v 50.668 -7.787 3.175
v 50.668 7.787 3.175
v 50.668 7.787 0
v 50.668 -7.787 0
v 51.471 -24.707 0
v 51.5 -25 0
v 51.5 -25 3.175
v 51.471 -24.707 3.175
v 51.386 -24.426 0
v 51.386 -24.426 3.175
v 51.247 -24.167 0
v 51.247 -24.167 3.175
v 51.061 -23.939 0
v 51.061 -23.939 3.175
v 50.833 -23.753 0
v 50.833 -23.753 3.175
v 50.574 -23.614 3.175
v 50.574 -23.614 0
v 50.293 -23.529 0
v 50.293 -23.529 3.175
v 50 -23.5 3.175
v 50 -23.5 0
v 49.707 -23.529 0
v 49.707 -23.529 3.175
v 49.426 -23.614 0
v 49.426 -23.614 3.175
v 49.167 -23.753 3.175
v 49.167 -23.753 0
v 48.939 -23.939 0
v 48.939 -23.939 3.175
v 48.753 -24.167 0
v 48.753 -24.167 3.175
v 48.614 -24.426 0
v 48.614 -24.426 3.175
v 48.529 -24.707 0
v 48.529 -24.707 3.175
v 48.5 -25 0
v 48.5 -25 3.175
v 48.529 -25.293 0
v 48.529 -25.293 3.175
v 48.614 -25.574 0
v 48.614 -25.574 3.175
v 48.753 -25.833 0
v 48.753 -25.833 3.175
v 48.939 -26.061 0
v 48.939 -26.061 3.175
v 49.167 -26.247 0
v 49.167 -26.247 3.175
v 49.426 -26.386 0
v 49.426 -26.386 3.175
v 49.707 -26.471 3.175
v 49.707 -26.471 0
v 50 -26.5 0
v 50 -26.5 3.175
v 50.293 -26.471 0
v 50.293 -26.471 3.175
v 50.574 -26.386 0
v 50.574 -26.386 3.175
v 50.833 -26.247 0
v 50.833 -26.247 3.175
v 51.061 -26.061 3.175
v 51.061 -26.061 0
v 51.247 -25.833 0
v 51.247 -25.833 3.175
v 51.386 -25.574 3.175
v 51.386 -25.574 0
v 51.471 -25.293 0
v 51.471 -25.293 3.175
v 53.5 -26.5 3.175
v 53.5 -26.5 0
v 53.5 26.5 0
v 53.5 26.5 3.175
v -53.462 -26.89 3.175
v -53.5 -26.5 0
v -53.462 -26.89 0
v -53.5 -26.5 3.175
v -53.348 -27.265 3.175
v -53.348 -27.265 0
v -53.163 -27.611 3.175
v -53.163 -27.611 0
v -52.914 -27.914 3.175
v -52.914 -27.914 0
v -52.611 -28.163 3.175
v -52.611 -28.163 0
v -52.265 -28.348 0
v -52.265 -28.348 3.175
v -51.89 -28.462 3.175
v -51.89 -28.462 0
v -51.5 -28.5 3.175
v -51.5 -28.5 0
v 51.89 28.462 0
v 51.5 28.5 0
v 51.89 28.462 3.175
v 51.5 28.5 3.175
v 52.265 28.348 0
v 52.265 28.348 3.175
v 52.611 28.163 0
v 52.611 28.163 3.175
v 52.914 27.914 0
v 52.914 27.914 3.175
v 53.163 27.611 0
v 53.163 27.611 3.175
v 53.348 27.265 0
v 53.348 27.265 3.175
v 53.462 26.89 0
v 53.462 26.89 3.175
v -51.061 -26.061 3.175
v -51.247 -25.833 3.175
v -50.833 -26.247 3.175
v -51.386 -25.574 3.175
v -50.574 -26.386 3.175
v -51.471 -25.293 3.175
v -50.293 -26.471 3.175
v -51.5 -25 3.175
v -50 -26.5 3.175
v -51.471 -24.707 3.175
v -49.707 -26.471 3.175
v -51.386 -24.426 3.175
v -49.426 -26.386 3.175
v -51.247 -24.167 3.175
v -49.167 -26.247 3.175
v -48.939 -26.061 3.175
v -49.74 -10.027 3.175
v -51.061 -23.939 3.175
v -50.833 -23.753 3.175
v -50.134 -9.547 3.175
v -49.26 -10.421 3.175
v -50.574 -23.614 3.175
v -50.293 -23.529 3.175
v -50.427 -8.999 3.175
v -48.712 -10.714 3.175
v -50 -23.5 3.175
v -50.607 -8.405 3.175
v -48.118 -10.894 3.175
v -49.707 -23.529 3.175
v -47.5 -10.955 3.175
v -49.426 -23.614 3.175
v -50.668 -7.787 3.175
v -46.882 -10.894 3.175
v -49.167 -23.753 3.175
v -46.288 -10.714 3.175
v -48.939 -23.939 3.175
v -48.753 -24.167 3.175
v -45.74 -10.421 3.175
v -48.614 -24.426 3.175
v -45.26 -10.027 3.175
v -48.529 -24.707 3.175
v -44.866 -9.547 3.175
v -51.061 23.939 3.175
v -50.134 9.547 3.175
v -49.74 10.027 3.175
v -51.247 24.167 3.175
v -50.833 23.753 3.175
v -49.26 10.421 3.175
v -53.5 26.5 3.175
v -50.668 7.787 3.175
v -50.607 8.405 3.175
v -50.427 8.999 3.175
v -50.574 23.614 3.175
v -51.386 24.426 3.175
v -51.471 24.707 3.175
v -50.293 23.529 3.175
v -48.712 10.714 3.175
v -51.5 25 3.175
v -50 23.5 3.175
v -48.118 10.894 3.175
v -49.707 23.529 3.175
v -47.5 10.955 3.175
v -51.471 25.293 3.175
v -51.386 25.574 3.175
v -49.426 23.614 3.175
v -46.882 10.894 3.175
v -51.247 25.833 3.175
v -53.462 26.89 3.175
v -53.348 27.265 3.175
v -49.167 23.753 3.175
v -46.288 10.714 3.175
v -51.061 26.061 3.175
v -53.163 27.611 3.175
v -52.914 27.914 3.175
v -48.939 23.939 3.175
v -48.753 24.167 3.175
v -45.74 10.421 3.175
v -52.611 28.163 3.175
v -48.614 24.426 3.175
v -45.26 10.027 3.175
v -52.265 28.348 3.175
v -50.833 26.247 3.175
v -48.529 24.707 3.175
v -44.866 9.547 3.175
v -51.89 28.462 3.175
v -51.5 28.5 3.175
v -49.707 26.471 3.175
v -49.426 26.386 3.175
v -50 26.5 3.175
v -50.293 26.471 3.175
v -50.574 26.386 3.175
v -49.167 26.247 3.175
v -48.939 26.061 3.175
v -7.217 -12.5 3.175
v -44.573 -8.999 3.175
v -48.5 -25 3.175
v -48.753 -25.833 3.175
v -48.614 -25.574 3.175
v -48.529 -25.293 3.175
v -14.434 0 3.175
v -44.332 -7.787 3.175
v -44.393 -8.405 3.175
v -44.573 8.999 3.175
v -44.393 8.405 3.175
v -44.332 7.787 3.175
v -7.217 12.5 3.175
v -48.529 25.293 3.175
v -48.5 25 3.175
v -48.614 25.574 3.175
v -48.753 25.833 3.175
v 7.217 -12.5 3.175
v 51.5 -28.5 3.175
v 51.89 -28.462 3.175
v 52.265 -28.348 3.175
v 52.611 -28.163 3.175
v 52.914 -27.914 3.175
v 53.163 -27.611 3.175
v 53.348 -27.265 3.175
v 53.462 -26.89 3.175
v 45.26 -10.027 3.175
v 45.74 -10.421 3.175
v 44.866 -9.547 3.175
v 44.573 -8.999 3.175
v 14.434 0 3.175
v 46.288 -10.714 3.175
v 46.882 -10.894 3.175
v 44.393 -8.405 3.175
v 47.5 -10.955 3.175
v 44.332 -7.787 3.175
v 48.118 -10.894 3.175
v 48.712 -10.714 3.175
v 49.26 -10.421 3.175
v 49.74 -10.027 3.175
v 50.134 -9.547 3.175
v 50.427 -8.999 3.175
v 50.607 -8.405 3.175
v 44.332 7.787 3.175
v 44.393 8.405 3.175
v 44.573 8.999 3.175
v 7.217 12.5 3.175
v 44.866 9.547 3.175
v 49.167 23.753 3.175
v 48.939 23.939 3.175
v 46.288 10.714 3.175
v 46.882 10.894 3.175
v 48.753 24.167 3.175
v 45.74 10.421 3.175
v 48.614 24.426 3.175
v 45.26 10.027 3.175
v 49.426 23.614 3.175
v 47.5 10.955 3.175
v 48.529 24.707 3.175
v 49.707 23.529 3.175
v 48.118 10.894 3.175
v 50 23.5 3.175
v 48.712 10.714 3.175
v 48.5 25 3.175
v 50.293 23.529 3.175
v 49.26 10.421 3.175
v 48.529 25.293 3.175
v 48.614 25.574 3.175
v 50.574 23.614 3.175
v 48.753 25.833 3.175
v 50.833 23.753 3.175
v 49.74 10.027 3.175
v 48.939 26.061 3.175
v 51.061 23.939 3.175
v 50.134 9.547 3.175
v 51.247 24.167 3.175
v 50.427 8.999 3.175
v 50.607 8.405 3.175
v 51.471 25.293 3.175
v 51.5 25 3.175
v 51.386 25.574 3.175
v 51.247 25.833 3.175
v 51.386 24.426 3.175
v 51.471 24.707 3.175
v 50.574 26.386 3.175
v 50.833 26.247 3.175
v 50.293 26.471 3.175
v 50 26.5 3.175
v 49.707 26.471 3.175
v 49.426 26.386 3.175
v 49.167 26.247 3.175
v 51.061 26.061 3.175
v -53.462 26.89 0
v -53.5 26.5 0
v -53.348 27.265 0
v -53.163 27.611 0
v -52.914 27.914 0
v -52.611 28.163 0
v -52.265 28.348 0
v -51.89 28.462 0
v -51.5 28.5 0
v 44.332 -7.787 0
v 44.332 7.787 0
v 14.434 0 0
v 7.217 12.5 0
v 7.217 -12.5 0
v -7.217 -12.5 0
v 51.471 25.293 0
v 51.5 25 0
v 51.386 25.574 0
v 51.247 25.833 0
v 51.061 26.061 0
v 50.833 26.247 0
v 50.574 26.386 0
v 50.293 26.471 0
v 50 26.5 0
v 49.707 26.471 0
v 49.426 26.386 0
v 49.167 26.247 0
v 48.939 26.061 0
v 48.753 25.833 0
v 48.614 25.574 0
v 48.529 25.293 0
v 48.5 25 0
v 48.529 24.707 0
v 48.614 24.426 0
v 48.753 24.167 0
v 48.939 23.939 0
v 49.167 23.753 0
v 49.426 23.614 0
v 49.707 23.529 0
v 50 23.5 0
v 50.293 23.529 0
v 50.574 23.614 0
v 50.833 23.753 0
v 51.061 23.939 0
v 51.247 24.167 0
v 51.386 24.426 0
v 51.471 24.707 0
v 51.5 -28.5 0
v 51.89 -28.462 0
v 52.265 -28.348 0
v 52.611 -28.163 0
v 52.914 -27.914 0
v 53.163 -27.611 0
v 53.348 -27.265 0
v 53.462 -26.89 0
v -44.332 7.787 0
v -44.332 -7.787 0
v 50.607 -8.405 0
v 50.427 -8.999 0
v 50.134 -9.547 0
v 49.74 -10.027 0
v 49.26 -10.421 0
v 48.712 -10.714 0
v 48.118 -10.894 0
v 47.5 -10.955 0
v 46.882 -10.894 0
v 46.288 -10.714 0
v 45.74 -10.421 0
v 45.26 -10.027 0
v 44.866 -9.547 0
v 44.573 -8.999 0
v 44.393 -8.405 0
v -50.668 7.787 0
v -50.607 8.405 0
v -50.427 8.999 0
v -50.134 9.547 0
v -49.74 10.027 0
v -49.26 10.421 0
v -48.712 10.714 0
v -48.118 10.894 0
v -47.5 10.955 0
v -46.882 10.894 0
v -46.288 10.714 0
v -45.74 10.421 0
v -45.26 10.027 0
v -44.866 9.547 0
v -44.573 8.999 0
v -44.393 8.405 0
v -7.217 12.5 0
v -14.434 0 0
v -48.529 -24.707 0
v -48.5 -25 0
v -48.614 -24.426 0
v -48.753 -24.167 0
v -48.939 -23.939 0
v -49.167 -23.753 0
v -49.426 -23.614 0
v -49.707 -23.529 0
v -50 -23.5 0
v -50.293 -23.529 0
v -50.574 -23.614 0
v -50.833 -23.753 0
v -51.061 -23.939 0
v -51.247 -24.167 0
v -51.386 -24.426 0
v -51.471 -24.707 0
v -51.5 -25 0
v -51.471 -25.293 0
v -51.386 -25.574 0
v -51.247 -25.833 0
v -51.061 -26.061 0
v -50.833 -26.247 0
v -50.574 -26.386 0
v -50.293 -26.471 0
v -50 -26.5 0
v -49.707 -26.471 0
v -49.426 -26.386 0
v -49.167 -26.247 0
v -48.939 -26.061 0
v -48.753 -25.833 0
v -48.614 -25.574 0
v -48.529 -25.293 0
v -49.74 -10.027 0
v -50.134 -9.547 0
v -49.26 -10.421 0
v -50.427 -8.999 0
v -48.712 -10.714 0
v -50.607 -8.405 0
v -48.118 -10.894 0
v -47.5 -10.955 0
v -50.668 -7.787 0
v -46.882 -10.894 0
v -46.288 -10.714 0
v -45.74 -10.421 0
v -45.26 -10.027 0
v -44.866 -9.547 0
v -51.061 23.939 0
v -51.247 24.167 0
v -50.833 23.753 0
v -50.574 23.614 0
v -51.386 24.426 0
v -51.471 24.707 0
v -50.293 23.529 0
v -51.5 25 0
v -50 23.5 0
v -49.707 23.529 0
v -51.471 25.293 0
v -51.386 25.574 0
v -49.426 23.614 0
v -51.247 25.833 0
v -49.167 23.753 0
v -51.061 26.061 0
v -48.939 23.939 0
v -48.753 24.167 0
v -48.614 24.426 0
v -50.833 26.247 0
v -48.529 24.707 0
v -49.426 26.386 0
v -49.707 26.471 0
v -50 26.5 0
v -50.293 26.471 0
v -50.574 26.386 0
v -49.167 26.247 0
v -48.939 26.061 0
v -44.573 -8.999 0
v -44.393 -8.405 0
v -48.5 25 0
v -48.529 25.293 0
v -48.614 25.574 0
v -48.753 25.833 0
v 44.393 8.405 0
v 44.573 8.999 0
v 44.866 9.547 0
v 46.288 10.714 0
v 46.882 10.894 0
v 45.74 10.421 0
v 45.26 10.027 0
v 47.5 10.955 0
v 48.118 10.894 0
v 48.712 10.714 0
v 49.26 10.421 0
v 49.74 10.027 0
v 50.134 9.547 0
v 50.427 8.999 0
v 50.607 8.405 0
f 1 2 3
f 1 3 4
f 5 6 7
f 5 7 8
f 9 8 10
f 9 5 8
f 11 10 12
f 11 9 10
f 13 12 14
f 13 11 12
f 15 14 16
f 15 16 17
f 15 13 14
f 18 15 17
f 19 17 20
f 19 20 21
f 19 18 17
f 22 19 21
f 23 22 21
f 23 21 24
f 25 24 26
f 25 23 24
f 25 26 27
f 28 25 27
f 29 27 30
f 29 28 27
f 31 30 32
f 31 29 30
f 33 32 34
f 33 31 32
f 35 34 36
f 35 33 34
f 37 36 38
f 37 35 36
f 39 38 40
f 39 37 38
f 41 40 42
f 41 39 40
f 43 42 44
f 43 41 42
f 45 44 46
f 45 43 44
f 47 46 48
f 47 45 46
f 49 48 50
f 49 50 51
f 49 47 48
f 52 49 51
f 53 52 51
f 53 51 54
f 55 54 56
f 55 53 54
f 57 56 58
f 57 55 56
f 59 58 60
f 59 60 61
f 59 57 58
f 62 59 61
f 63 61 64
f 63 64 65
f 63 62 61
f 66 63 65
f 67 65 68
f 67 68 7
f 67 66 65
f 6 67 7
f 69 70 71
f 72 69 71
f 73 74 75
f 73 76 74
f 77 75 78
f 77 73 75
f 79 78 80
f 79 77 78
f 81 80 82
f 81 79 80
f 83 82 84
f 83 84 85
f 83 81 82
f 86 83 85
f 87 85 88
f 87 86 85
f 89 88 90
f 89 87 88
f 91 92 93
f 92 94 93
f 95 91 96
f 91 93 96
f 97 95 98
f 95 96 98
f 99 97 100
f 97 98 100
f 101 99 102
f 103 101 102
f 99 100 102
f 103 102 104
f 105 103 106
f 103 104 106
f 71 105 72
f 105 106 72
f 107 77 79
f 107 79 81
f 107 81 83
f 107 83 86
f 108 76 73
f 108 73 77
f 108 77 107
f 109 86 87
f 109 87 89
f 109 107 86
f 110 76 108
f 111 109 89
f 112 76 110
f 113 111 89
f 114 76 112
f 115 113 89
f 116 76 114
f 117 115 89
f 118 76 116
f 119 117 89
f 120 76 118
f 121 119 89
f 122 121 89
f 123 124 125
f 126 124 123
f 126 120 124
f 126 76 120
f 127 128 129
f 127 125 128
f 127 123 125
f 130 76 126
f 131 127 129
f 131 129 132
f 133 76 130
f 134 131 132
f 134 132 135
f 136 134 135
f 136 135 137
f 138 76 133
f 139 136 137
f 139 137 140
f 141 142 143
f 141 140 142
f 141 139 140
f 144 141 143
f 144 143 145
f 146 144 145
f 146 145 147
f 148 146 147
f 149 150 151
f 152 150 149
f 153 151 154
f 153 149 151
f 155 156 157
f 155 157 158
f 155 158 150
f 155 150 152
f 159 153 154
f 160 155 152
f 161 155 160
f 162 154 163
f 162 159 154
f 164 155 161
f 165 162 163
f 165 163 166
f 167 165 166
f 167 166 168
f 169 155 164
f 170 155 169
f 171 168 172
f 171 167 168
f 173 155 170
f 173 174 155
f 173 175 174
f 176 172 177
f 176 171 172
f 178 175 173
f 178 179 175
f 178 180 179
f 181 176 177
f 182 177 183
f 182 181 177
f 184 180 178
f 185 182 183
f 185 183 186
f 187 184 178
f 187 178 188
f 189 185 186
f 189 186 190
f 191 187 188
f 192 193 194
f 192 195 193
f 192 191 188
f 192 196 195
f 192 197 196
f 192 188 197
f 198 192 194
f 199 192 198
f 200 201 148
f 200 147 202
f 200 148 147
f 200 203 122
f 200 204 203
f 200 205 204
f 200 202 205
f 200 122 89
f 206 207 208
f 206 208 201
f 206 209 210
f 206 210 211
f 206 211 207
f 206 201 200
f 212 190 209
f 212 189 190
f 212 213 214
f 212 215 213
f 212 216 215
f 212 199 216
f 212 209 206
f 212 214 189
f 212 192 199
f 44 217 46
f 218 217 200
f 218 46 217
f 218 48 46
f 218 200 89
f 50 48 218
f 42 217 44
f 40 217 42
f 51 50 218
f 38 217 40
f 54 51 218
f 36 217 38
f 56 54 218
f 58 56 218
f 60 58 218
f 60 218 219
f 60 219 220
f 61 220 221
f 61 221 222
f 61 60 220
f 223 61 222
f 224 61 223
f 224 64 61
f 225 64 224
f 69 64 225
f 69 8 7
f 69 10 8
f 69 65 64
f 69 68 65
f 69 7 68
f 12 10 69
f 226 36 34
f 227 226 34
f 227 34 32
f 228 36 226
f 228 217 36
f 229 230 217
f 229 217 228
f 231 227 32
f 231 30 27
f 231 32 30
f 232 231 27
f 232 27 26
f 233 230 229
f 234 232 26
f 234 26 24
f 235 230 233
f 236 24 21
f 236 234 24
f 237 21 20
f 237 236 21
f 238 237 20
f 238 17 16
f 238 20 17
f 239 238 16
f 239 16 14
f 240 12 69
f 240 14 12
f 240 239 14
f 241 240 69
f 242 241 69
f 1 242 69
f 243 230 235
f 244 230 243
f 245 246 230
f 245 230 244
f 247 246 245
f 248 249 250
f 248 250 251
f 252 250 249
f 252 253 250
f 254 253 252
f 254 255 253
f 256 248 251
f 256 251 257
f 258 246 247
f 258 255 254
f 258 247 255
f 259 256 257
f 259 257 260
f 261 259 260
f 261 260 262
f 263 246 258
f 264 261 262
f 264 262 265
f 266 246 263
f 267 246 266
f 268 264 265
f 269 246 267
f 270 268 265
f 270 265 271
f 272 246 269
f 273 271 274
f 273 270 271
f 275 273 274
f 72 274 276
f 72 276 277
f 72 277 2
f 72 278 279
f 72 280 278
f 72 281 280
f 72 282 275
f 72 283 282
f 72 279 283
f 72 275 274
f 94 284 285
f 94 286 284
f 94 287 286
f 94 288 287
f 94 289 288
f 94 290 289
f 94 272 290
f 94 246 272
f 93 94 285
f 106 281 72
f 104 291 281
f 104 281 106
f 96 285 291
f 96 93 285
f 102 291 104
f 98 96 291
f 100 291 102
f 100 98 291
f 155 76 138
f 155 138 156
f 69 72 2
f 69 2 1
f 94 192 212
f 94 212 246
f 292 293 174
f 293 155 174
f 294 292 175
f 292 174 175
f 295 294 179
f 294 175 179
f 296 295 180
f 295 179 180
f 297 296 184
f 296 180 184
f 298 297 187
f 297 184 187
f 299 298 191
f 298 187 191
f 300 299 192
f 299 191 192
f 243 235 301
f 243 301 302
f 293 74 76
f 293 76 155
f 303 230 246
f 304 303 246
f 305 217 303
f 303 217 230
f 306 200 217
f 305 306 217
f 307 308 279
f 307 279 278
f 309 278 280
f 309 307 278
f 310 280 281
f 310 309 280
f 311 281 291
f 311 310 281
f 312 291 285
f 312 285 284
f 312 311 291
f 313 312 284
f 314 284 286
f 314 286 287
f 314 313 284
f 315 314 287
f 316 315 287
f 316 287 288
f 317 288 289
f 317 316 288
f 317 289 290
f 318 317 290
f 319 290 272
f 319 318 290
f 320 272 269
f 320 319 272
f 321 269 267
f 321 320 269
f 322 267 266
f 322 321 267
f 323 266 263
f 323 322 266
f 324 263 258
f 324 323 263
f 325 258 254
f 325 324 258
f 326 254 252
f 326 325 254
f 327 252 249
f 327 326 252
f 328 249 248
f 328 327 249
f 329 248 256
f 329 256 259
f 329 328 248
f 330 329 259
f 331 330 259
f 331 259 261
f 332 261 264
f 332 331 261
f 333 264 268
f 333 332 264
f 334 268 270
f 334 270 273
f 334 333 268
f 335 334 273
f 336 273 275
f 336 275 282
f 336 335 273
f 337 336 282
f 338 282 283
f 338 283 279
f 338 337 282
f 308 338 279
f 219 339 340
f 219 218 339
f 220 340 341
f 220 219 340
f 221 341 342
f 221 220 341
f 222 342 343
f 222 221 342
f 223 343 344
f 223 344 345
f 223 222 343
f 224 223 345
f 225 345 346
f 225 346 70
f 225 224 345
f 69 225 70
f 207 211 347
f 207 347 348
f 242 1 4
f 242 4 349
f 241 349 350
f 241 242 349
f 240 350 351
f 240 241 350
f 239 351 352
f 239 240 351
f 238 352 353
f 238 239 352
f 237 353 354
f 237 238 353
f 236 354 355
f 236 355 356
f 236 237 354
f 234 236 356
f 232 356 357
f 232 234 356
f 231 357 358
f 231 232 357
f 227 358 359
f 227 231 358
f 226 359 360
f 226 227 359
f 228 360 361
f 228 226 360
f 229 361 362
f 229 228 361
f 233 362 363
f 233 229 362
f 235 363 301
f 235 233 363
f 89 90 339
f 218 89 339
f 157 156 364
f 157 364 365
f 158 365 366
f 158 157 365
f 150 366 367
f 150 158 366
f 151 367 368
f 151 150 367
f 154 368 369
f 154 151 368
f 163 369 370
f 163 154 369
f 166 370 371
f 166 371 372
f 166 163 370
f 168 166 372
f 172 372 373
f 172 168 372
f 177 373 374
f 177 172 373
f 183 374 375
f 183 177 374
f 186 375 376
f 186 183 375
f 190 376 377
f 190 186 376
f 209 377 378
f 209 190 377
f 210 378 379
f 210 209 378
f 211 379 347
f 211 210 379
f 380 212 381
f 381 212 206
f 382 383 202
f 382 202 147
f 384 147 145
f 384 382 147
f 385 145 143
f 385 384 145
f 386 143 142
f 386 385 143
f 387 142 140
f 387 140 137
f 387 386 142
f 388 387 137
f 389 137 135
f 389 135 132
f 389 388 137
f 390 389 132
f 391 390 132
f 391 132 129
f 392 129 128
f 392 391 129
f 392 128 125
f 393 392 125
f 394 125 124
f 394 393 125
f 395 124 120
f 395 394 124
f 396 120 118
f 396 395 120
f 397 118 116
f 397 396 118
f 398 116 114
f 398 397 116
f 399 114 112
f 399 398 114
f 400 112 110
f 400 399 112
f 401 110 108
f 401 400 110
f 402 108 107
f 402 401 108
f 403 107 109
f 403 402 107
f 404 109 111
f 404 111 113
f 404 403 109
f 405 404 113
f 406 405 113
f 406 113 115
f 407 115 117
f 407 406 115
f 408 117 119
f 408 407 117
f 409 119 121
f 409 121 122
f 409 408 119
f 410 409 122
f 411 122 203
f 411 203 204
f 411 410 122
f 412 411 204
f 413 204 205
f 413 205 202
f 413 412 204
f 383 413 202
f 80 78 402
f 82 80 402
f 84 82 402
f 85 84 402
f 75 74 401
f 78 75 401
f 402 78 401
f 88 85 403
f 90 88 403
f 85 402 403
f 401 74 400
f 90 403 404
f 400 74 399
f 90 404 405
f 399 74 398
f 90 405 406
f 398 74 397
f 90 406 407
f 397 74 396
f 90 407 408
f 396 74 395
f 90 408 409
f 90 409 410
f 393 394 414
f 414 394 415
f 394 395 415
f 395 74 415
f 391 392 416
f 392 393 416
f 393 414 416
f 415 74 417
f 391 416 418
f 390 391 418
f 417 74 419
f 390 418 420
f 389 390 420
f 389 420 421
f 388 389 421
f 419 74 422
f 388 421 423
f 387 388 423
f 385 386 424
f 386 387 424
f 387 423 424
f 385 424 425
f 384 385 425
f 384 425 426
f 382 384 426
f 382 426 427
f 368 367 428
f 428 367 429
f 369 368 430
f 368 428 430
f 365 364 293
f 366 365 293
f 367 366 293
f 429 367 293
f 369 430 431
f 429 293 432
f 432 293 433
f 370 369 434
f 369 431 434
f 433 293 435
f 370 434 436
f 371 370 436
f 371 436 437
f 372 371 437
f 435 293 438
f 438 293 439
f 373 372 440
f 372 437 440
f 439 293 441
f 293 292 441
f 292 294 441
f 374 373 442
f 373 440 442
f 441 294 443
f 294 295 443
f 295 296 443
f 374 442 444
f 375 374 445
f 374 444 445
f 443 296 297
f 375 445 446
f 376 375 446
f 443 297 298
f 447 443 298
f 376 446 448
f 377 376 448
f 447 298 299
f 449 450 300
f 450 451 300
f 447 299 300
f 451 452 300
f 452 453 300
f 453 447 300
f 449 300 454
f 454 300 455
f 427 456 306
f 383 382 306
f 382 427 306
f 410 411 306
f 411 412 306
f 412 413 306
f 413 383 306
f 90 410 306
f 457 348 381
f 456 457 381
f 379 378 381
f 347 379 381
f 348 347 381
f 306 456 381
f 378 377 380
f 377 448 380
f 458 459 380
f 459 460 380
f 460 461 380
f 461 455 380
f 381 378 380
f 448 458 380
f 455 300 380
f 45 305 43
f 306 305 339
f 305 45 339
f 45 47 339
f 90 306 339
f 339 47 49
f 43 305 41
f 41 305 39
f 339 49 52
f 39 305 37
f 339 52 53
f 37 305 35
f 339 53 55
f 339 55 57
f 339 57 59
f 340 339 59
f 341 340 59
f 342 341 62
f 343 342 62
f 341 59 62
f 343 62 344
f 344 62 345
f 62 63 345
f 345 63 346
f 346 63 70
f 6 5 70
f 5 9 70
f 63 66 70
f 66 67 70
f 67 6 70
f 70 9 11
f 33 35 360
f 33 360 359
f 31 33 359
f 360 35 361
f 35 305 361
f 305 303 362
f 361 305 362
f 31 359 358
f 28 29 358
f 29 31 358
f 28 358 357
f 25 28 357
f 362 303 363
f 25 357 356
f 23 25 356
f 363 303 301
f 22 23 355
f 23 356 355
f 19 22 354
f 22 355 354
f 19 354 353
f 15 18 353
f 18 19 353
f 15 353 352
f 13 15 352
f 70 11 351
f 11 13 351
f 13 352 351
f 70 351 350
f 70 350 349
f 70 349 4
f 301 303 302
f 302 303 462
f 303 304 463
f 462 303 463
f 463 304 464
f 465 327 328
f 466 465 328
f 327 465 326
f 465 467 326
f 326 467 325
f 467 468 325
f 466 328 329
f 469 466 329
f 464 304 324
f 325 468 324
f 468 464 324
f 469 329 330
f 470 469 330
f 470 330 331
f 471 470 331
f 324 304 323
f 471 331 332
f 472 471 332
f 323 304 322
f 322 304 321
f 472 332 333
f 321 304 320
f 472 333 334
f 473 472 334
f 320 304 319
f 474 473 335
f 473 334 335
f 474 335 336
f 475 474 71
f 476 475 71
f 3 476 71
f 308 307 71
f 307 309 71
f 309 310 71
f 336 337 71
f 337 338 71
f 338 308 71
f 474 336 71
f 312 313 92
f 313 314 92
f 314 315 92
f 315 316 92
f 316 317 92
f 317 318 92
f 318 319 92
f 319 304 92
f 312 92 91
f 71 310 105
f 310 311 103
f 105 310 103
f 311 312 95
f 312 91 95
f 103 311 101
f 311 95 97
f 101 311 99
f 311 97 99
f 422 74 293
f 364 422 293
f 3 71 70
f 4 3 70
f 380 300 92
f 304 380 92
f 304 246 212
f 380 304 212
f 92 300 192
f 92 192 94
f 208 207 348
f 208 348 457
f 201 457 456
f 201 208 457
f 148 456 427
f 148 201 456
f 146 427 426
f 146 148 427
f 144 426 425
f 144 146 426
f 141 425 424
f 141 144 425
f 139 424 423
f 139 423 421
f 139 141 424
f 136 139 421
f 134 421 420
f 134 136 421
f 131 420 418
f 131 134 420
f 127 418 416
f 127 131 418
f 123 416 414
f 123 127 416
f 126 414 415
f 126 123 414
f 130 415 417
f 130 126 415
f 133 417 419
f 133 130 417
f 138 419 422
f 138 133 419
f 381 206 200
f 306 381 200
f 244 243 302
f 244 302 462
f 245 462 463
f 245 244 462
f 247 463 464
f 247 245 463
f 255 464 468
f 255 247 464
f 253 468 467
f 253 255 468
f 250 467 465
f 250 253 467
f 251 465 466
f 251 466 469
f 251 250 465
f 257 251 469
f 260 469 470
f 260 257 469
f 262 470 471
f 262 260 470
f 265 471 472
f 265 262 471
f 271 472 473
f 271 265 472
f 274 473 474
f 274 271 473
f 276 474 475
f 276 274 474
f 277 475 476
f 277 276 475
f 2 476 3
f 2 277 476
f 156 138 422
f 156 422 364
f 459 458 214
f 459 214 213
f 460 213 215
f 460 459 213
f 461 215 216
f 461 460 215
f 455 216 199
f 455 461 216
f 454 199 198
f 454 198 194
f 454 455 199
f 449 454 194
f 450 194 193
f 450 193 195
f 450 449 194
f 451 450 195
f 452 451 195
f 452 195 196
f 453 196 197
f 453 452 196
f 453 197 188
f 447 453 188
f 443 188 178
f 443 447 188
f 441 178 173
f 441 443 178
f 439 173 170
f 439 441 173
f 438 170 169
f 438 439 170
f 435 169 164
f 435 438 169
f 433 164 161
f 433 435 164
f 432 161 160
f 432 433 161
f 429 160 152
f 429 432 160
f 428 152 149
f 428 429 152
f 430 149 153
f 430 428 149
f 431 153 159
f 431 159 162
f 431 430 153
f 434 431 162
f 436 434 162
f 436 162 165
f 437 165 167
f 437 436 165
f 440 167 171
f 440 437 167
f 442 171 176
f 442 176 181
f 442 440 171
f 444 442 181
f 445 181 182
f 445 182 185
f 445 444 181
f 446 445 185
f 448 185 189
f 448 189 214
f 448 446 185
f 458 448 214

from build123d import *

# Parameters (mm, degrees)
SKETCH1_W           = 107
SKETCH1_H           = 57
SKETCH1_R           = 1.5
BOSS_EXTRUDE1_DEPTH = 3.175
FILLET1_R           = 2
CUT_EXTRUDE1_DEPTH  = 3.175


with BuildPart() as part:
    # Sketch1 → Boss-Extrude1 (new body)
    with BuildSketch(Plane.XY):
        Rectangle(SKETCH1_W, SKETCH1_H)
        with Locations((-50, 25)):
            Circle(SKETCH1_R, mode=Mode.SUBTRACT)
        with Locations((50, 25)):
            Circle(SKETCH1_R, mode=Mode.SUBTRACT)
        with Locations((-50, -25)):
            Circle(SKETCH1_R, mode=Mode.SUBTRACT)
        with Locations((50, -25)):
            Circle(SKETCH1_R, mode=Mode.SUBTRACT)
    extrude(amount=BOSS_EXTRUDE1_DEPTH)

    # Fillet1
    fillet1_edges = [part.edges().sort_by_distance(p)[0] for p in [
        (-53.5, 28.5, 1.5875),
        (53.5, 28.5, 1.5875),
        (53.5, -28.5, 1.5875),
        (-53.5, -28.5, 1.5875),
    ]]
    fillet(fillet1_edges, radius=FILLET1_R)

    # Sketch2 → Cut-Extrude1 (cut)
    with BuildSketch(Plane.XY.offset(3.175)):
        with BuildLine():
            Line((44.332340651, -7.787162566), (44.332340651, 7.787162566))
            ThreePointArc((44.332340651, 7.787162566), (47.5, 10.954821915), (50.667659349, 7.787162566))
            Line((50.667659349, 7.787162566), (50.667659349, -7.787162566))
            ThreePointArc((50.667659349, -7.787162566), (47.5, -10.954821915), (44.332340651, -7.787162566))
        make_face()
        with BuildLine():
            Line((-50.667659349, -7.787162566), (-50.667659349, 7.787162566))
            ThreePointArc((-50.667659349, 7.787162566), (-47.5, 10.954821915), (-44.332340651, 7.787162566))
            Line((-44.332340651, 7.787162566), (-44.332340651, -7.787162566))
            ThreePointArc((-44.332340651, -7.787162566), (-47.5, -10.954821915), (-50.667659349, -7.787162566))
        make_face()
        Polygon((14.43375673, 0), (7.216878365, 12.5), (-7.216878365, 12.5), (-14.43375673, 0), (-7.216878365, -12.5), (7.216878365, -12.5), align=None)
    extrude(amount=-CUT_EXTRUDE1_DEPTH, mode=Mode.SUBTRACT)


solid = part.part
